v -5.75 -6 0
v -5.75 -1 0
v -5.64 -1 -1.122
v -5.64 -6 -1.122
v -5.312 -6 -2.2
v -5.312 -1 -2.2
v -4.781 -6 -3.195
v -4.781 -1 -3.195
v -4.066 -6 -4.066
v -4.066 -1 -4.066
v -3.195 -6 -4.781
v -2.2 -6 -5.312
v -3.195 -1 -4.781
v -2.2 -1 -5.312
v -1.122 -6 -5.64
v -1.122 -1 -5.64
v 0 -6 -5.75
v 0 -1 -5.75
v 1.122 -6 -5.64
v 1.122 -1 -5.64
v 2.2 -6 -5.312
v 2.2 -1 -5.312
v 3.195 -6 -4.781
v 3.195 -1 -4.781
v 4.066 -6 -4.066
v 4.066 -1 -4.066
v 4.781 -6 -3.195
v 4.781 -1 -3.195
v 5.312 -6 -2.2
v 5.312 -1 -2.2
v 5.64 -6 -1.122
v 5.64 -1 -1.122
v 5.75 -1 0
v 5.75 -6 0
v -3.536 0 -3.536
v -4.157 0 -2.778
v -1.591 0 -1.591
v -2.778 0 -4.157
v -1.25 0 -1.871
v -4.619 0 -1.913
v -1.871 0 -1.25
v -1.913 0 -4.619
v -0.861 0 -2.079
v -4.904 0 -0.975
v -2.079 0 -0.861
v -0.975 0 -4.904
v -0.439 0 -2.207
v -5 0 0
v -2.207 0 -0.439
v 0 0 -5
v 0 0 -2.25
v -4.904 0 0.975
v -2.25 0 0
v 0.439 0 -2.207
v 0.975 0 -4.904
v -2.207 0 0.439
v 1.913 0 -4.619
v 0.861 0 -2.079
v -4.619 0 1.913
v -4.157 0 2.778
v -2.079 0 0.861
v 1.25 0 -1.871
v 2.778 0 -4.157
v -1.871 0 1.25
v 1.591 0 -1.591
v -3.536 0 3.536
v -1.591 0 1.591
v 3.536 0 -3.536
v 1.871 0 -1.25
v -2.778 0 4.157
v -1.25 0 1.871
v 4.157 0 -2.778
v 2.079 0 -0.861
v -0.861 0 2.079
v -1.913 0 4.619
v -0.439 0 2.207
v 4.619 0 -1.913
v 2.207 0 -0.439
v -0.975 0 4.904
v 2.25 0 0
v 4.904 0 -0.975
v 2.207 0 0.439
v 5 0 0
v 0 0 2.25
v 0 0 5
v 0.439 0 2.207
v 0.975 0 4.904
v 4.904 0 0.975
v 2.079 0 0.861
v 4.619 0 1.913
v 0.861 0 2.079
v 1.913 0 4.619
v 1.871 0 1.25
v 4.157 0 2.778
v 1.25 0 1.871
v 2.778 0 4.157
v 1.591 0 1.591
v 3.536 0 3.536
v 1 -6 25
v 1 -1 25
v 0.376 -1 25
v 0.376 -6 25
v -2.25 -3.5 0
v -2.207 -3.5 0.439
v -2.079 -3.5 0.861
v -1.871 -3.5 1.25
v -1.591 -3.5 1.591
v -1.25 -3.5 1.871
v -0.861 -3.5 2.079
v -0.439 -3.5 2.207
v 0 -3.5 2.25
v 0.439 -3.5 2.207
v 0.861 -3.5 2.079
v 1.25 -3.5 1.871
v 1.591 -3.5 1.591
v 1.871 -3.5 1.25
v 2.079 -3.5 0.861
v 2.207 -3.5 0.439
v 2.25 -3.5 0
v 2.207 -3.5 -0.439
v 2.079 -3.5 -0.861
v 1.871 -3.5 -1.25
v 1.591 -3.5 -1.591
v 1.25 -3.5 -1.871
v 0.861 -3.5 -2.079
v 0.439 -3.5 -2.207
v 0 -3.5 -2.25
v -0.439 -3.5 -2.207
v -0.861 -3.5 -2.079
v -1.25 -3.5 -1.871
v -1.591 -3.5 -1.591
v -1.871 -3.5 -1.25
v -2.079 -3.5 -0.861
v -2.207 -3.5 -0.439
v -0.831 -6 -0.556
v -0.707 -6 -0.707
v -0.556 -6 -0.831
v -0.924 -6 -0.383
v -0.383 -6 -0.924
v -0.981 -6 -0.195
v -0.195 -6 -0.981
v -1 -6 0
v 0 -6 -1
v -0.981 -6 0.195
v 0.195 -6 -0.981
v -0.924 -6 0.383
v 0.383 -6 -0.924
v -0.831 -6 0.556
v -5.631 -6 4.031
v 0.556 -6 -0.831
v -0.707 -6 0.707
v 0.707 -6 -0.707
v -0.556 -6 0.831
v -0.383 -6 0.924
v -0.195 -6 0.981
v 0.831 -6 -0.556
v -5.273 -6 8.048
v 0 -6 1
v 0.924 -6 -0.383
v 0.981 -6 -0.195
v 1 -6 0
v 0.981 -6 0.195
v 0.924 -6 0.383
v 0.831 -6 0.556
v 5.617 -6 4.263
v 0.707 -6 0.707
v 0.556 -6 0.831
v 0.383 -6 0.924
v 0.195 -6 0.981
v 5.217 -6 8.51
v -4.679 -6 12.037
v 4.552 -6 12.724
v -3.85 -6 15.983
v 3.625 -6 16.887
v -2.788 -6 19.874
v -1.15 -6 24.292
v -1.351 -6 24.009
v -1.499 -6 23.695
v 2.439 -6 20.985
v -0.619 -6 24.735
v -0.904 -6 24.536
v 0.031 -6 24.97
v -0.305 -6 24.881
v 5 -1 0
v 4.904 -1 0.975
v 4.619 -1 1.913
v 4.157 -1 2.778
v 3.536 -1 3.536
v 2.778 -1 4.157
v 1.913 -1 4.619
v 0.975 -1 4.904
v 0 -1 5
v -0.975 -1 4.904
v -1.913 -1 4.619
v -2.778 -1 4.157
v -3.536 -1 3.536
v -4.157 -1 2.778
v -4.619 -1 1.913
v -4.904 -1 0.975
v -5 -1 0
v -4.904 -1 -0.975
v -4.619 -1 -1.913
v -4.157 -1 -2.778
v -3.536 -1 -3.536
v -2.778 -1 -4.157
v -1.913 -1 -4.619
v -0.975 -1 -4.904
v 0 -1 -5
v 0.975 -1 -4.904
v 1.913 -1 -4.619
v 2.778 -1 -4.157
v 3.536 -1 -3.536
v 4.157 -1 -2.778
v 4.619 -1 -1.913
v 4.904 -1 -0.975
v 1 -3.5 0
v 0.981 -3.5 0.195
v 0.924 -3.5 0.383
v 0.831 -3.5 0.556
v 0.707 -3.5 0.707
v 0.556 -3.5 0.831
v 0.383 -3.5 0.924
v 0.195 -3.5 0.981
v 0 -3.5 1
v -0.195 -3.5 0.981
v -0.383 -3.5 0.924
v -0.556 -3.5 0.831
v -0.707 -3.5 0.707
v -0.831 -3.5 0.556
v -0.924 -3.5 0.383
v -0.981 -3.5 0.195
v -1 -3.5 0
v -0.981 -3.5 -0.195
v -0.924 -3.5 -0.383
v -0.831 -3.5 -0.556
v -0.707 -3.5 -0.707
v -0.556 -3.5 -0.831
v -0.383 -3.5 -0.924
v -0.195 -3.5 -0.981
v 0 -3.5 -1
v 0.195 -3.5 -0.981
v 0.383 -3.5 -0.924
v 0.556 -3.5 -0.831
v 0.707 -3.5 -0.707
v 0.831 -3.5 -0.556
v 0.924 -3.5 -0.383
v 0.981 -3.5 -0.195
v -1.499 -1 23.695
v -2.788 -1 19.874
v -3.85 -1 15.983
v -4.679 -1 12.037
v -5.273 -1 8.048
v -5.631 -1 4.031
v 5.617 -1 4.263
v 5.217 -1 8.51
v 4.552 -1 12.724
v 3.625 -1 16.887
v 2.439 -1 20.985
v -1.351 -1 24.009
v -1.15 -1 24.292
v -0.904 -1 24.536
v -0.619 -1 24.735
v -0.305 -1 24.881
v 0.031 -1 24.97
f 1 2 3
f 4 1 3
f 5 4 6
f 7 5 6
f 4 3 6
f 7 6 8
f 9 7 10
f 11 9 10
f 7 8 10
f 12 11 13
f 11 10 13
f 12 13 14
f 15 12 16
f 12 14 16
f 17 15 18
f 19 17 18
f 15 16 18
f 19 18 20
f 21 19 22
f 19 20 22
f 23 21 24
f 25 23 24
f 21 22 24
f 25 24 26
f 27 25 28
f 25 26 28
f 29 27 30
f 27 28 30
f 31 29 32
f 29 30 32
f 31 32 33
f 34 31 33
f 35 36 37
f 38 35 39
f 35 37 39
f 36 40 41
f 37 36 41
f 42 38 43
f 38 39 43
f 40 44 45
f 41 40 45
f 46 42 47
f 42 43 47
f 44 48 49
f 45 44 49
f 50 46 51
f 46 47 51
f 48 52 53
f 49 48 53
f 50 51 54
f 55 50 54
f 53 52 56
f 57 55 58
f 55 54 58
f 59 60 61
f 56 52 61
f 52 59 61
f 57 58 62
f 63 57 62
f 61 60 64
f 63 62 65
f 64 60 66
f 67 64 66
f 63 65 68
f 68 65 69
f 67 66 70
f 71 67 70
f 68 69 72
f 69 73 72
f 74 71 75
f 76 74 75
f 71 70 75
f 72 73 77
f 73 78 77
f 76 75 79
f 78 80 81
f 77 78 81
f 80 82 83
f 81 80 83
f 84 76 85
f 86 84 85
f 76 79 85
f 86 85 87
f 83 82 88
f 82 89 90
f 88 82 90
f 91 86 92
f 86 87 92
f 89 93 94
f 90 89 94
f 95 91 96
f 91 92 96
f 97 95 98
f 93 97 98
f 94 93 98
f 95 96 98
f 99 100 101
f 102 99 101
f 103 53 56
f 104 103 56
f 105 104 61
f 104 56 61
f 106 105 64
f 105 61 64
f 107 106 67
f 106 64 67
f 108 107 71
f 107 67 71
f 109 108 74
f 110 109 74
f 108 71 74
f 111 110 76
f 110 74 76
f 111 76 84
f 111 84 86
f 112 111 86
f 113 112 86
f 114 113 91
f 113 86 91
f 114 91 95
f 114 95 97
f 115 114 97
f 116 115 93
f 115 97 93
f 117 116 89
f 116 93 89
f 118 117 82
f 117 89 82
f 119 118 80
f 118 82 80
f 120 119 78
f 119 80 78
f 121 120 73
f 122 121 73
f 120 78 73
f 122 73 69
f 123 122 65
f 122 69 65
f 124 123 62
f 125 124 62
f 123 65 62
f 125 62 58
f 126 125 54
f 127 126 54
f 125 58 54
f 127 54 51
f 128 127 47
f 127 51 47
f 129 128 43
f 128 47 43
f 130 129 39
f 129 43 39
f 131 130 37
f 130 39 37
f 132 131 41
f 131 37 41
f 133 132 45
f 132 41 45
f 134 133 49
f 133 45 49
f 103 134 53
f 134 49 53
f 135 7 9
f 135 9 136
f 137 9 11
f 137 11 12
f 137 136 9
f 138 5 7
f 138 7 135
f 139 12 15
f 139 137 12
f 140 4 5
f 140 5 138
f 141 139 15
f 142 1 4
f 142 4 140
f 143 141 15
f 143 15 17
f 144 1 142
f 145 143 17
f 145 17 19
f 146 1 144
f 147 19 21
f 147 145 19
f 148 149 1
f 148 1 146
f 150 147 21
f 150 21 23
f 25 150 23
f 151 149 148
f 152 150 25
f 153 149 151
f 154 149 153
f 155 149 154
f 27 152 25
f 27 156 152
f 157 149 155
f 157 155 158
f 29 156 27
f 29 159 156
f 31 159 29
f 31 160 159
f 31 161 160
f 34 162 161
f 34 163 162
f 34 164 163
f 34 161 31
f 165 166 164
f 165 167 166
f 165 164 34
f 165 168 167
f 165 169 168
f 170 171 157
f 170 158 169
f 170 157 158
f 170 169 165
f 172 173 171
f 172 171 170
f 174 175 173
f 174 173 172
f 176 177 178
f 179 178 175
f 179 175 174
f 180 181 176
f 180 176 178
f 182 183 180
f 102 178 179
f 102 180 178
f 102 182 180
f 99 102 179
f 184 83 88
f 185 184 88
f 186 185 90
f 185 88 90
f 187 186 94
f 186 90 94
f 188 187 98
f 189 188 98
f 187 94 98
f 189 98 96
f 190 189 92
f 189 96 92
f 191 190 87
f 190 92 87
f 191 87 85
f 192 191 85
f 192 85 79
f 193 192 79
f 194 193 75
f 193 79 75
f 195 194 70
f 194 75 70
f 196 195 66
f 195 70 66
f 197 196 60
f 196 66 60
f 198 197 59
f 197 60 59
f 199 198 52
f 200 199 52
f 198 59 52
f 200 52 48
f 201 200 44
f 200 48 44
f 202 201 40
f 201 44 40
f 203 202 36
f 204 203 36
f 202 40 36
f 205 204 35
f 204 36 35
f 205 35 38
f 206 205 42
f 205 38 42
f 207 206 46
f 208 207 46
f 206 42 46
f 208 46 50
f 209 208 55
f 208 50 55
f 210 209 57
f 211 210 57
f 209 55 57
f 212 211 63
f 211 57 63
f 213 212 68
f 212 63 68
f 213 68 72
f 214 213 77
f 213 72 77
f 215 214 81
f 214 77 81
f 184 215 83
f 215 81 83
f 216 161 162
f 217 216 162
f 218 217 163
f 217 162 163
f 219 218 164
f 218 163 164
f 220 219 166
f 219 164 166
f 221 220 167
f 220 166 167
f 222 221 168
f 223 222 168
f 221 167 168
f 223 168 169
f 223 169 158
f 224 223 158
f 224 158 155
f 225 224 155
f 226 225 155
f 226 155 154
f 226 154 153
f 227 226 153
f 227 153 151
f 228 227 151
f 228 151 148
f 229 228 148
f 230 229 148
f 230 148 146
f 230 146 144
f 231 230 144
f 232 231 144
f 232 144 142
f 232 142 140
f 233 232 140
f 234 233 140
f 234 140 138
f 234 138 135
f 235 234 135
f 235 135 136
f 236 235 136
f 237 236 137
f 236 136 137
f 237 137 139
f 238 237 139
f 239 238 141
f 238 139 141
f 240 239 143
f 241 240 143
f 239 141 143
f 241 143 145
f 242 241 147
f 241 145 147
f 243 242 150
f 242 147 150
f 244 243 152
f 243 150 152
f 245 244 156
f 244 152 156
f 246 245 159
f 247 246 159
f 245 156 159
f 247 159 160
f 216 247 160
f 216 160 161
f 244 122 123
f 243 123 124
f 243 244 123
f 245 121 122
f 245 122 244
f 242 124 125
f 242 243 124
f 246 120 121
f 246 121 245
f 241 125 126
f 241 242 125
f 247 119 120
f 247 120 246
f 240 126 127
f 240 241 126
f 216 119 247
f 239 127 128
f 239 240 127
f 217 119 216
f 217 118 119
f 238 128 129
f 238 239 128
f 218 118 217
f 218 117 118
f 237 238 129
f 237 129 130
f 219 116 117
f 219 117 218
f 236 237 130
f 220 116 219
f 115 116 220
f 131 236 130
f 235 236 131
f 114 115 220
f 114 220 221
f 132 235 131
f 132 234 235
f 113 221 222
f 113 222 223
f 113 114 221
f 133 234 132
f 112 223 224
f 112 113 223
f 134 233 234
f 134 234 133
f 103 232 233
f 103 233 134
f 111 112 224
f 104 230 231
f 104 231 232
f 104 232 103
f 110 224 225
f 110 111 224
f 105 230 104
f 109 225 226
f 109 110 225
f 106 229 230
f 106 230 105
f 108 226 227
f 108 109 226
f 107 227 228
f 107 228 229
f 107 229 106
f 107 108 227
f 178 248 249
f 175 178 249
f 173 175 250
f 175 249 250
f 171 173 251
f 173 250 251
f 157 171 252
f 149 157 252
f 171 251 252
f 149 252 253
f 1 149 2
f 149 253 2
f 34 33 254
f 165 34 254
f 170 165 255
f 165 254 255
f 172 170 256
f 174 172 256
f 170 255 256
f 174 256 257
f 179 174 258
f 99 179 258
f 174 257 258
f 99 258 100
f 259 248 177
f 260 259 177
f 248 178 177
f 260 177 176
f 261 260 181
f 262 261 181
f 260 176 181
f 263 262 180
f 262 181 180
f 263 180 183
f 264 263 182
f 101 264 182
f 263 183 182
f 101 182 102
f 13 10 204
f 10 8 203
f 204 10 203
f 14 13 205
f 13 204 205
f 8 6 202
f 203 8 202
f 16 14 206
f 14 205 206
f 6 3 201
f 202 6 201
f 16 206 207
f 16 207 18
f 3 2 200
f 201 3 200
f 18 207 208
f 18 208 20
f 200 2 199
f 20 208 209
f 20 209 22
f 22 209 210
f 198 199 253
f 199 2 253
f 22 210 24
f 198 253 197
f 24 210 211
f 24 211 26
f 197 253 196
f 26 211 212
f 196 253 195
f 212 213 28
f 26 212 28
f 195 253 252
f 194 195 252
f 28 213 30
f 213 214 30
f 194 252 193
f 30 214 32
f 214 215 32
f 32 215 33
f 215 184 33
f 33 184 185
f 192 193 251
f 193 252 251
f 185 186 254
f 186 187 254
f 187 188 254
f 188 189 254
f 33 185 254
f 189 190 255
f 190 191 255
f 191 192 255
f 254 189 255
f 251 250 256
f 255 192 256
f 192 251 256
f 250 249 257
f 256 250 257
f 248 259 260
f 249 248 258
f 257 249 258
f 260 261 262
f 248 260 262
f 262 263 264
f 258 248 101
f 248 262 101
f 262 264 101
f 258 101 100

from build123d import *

# Parameters (mm, degrees)
F0_R     = 5
F1_DEPTH = 1
F3_DEPTH = 5
F4_R     = 2.25
F5_DEPTH = 3.5
F6_R     = 1
F7_DEPTH = 25
F8_R     = 2


with BuildPart() as f1:
    # F0 (on Front) → F1 (new body)
    with BuildSketch(Plane.XZ):
        Circle(F0_R)
    extrude(amount=F1_DEPTH)

    # F2 (on face) → F3 (join)
    with BuildSketch(Plane.XZ.offset(1)):
        with BuildLine():
            ThreePointArc((-1, 25), (-4.551972, 12.723625), (-5.75, 0))
            ThreePointArc((-5.75, 0), (0, -5.75), (5.75, 0))
            ThreePointArc((5.75, 0), (4.551972, 12.723625), (1, 25))
            Line((1, 25), (-1, 25))
        make_face()
    extrude(amount=F3_DEPTH)

    # F4 (on face) → F5 (cut)
    with BuildSketch(Plane(origin=(0, 0, 0), x_dir=(-1, 0, 0), z_dir=(0, 1, 0))):
        Circle(F4_R)
    extrude(amount=-F5_DEPTH, mode=Mode.SUBTRACT)

    # F6 (on face) → F7 (cut)
    with BuildSketch(Plane.XZ.offset(6)):
        Circle(F6_R)
    extrude(amount=-F7_DEPTH, mode=Mode.SUBTRACT)

    # F8
    f8_edges = [f1.edges().sort_by_distance(p)[0] for p in [
        (-1, -3.5, 25),
    ]]
    fillet(f8_edges, radius=F8_R)


solid = f1.part
